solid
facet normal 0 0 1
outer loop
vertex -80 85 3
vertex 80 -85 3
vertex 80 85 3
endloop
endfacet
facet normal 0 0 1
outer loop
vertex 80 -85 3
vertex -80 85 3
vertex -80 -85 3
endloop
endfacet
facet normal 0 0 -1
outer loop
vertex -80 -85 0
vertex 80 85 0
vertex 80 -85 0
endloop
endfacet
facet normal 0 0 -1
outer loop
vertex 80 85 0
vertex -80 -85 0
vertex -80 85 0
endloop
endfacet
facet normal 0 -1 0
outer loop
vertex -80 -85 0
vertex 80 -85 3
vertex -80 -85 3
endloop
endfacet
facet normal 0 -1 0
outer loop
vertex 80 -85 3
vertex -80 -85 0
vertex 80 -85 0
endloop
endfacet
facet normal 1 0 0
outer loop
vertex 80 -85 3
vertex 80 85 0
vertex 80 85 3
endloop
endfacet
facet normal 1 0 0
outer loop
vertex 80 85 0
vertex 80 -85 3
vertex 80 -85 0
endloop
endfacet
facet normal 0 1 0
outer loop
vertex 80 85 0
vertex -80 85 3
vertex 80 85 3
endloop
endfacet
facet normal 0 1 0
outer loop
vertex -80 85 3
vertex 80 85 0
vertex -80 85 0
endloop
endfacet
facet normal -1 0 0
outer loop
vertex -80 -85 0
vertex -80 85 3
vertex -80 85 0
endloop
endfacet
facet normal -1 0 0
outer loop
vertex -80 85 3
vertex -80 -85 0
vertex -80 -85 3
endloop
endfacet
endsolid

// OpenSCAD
// Piano inferiore grezzo: quote confermate, nessun foro ancora quotato.
// Unita: millimetri.

piano_lunghezza = 170;
piano_larghezza = 160;
piano_spessore = 3;

// Origine al centro della faccia inferiore.
translate([-piano_larghezza / 2, -piano_lunghezza / 2, 0])
    cube([piano_larghezza, piano_lunghezza, piano_spessore]);
